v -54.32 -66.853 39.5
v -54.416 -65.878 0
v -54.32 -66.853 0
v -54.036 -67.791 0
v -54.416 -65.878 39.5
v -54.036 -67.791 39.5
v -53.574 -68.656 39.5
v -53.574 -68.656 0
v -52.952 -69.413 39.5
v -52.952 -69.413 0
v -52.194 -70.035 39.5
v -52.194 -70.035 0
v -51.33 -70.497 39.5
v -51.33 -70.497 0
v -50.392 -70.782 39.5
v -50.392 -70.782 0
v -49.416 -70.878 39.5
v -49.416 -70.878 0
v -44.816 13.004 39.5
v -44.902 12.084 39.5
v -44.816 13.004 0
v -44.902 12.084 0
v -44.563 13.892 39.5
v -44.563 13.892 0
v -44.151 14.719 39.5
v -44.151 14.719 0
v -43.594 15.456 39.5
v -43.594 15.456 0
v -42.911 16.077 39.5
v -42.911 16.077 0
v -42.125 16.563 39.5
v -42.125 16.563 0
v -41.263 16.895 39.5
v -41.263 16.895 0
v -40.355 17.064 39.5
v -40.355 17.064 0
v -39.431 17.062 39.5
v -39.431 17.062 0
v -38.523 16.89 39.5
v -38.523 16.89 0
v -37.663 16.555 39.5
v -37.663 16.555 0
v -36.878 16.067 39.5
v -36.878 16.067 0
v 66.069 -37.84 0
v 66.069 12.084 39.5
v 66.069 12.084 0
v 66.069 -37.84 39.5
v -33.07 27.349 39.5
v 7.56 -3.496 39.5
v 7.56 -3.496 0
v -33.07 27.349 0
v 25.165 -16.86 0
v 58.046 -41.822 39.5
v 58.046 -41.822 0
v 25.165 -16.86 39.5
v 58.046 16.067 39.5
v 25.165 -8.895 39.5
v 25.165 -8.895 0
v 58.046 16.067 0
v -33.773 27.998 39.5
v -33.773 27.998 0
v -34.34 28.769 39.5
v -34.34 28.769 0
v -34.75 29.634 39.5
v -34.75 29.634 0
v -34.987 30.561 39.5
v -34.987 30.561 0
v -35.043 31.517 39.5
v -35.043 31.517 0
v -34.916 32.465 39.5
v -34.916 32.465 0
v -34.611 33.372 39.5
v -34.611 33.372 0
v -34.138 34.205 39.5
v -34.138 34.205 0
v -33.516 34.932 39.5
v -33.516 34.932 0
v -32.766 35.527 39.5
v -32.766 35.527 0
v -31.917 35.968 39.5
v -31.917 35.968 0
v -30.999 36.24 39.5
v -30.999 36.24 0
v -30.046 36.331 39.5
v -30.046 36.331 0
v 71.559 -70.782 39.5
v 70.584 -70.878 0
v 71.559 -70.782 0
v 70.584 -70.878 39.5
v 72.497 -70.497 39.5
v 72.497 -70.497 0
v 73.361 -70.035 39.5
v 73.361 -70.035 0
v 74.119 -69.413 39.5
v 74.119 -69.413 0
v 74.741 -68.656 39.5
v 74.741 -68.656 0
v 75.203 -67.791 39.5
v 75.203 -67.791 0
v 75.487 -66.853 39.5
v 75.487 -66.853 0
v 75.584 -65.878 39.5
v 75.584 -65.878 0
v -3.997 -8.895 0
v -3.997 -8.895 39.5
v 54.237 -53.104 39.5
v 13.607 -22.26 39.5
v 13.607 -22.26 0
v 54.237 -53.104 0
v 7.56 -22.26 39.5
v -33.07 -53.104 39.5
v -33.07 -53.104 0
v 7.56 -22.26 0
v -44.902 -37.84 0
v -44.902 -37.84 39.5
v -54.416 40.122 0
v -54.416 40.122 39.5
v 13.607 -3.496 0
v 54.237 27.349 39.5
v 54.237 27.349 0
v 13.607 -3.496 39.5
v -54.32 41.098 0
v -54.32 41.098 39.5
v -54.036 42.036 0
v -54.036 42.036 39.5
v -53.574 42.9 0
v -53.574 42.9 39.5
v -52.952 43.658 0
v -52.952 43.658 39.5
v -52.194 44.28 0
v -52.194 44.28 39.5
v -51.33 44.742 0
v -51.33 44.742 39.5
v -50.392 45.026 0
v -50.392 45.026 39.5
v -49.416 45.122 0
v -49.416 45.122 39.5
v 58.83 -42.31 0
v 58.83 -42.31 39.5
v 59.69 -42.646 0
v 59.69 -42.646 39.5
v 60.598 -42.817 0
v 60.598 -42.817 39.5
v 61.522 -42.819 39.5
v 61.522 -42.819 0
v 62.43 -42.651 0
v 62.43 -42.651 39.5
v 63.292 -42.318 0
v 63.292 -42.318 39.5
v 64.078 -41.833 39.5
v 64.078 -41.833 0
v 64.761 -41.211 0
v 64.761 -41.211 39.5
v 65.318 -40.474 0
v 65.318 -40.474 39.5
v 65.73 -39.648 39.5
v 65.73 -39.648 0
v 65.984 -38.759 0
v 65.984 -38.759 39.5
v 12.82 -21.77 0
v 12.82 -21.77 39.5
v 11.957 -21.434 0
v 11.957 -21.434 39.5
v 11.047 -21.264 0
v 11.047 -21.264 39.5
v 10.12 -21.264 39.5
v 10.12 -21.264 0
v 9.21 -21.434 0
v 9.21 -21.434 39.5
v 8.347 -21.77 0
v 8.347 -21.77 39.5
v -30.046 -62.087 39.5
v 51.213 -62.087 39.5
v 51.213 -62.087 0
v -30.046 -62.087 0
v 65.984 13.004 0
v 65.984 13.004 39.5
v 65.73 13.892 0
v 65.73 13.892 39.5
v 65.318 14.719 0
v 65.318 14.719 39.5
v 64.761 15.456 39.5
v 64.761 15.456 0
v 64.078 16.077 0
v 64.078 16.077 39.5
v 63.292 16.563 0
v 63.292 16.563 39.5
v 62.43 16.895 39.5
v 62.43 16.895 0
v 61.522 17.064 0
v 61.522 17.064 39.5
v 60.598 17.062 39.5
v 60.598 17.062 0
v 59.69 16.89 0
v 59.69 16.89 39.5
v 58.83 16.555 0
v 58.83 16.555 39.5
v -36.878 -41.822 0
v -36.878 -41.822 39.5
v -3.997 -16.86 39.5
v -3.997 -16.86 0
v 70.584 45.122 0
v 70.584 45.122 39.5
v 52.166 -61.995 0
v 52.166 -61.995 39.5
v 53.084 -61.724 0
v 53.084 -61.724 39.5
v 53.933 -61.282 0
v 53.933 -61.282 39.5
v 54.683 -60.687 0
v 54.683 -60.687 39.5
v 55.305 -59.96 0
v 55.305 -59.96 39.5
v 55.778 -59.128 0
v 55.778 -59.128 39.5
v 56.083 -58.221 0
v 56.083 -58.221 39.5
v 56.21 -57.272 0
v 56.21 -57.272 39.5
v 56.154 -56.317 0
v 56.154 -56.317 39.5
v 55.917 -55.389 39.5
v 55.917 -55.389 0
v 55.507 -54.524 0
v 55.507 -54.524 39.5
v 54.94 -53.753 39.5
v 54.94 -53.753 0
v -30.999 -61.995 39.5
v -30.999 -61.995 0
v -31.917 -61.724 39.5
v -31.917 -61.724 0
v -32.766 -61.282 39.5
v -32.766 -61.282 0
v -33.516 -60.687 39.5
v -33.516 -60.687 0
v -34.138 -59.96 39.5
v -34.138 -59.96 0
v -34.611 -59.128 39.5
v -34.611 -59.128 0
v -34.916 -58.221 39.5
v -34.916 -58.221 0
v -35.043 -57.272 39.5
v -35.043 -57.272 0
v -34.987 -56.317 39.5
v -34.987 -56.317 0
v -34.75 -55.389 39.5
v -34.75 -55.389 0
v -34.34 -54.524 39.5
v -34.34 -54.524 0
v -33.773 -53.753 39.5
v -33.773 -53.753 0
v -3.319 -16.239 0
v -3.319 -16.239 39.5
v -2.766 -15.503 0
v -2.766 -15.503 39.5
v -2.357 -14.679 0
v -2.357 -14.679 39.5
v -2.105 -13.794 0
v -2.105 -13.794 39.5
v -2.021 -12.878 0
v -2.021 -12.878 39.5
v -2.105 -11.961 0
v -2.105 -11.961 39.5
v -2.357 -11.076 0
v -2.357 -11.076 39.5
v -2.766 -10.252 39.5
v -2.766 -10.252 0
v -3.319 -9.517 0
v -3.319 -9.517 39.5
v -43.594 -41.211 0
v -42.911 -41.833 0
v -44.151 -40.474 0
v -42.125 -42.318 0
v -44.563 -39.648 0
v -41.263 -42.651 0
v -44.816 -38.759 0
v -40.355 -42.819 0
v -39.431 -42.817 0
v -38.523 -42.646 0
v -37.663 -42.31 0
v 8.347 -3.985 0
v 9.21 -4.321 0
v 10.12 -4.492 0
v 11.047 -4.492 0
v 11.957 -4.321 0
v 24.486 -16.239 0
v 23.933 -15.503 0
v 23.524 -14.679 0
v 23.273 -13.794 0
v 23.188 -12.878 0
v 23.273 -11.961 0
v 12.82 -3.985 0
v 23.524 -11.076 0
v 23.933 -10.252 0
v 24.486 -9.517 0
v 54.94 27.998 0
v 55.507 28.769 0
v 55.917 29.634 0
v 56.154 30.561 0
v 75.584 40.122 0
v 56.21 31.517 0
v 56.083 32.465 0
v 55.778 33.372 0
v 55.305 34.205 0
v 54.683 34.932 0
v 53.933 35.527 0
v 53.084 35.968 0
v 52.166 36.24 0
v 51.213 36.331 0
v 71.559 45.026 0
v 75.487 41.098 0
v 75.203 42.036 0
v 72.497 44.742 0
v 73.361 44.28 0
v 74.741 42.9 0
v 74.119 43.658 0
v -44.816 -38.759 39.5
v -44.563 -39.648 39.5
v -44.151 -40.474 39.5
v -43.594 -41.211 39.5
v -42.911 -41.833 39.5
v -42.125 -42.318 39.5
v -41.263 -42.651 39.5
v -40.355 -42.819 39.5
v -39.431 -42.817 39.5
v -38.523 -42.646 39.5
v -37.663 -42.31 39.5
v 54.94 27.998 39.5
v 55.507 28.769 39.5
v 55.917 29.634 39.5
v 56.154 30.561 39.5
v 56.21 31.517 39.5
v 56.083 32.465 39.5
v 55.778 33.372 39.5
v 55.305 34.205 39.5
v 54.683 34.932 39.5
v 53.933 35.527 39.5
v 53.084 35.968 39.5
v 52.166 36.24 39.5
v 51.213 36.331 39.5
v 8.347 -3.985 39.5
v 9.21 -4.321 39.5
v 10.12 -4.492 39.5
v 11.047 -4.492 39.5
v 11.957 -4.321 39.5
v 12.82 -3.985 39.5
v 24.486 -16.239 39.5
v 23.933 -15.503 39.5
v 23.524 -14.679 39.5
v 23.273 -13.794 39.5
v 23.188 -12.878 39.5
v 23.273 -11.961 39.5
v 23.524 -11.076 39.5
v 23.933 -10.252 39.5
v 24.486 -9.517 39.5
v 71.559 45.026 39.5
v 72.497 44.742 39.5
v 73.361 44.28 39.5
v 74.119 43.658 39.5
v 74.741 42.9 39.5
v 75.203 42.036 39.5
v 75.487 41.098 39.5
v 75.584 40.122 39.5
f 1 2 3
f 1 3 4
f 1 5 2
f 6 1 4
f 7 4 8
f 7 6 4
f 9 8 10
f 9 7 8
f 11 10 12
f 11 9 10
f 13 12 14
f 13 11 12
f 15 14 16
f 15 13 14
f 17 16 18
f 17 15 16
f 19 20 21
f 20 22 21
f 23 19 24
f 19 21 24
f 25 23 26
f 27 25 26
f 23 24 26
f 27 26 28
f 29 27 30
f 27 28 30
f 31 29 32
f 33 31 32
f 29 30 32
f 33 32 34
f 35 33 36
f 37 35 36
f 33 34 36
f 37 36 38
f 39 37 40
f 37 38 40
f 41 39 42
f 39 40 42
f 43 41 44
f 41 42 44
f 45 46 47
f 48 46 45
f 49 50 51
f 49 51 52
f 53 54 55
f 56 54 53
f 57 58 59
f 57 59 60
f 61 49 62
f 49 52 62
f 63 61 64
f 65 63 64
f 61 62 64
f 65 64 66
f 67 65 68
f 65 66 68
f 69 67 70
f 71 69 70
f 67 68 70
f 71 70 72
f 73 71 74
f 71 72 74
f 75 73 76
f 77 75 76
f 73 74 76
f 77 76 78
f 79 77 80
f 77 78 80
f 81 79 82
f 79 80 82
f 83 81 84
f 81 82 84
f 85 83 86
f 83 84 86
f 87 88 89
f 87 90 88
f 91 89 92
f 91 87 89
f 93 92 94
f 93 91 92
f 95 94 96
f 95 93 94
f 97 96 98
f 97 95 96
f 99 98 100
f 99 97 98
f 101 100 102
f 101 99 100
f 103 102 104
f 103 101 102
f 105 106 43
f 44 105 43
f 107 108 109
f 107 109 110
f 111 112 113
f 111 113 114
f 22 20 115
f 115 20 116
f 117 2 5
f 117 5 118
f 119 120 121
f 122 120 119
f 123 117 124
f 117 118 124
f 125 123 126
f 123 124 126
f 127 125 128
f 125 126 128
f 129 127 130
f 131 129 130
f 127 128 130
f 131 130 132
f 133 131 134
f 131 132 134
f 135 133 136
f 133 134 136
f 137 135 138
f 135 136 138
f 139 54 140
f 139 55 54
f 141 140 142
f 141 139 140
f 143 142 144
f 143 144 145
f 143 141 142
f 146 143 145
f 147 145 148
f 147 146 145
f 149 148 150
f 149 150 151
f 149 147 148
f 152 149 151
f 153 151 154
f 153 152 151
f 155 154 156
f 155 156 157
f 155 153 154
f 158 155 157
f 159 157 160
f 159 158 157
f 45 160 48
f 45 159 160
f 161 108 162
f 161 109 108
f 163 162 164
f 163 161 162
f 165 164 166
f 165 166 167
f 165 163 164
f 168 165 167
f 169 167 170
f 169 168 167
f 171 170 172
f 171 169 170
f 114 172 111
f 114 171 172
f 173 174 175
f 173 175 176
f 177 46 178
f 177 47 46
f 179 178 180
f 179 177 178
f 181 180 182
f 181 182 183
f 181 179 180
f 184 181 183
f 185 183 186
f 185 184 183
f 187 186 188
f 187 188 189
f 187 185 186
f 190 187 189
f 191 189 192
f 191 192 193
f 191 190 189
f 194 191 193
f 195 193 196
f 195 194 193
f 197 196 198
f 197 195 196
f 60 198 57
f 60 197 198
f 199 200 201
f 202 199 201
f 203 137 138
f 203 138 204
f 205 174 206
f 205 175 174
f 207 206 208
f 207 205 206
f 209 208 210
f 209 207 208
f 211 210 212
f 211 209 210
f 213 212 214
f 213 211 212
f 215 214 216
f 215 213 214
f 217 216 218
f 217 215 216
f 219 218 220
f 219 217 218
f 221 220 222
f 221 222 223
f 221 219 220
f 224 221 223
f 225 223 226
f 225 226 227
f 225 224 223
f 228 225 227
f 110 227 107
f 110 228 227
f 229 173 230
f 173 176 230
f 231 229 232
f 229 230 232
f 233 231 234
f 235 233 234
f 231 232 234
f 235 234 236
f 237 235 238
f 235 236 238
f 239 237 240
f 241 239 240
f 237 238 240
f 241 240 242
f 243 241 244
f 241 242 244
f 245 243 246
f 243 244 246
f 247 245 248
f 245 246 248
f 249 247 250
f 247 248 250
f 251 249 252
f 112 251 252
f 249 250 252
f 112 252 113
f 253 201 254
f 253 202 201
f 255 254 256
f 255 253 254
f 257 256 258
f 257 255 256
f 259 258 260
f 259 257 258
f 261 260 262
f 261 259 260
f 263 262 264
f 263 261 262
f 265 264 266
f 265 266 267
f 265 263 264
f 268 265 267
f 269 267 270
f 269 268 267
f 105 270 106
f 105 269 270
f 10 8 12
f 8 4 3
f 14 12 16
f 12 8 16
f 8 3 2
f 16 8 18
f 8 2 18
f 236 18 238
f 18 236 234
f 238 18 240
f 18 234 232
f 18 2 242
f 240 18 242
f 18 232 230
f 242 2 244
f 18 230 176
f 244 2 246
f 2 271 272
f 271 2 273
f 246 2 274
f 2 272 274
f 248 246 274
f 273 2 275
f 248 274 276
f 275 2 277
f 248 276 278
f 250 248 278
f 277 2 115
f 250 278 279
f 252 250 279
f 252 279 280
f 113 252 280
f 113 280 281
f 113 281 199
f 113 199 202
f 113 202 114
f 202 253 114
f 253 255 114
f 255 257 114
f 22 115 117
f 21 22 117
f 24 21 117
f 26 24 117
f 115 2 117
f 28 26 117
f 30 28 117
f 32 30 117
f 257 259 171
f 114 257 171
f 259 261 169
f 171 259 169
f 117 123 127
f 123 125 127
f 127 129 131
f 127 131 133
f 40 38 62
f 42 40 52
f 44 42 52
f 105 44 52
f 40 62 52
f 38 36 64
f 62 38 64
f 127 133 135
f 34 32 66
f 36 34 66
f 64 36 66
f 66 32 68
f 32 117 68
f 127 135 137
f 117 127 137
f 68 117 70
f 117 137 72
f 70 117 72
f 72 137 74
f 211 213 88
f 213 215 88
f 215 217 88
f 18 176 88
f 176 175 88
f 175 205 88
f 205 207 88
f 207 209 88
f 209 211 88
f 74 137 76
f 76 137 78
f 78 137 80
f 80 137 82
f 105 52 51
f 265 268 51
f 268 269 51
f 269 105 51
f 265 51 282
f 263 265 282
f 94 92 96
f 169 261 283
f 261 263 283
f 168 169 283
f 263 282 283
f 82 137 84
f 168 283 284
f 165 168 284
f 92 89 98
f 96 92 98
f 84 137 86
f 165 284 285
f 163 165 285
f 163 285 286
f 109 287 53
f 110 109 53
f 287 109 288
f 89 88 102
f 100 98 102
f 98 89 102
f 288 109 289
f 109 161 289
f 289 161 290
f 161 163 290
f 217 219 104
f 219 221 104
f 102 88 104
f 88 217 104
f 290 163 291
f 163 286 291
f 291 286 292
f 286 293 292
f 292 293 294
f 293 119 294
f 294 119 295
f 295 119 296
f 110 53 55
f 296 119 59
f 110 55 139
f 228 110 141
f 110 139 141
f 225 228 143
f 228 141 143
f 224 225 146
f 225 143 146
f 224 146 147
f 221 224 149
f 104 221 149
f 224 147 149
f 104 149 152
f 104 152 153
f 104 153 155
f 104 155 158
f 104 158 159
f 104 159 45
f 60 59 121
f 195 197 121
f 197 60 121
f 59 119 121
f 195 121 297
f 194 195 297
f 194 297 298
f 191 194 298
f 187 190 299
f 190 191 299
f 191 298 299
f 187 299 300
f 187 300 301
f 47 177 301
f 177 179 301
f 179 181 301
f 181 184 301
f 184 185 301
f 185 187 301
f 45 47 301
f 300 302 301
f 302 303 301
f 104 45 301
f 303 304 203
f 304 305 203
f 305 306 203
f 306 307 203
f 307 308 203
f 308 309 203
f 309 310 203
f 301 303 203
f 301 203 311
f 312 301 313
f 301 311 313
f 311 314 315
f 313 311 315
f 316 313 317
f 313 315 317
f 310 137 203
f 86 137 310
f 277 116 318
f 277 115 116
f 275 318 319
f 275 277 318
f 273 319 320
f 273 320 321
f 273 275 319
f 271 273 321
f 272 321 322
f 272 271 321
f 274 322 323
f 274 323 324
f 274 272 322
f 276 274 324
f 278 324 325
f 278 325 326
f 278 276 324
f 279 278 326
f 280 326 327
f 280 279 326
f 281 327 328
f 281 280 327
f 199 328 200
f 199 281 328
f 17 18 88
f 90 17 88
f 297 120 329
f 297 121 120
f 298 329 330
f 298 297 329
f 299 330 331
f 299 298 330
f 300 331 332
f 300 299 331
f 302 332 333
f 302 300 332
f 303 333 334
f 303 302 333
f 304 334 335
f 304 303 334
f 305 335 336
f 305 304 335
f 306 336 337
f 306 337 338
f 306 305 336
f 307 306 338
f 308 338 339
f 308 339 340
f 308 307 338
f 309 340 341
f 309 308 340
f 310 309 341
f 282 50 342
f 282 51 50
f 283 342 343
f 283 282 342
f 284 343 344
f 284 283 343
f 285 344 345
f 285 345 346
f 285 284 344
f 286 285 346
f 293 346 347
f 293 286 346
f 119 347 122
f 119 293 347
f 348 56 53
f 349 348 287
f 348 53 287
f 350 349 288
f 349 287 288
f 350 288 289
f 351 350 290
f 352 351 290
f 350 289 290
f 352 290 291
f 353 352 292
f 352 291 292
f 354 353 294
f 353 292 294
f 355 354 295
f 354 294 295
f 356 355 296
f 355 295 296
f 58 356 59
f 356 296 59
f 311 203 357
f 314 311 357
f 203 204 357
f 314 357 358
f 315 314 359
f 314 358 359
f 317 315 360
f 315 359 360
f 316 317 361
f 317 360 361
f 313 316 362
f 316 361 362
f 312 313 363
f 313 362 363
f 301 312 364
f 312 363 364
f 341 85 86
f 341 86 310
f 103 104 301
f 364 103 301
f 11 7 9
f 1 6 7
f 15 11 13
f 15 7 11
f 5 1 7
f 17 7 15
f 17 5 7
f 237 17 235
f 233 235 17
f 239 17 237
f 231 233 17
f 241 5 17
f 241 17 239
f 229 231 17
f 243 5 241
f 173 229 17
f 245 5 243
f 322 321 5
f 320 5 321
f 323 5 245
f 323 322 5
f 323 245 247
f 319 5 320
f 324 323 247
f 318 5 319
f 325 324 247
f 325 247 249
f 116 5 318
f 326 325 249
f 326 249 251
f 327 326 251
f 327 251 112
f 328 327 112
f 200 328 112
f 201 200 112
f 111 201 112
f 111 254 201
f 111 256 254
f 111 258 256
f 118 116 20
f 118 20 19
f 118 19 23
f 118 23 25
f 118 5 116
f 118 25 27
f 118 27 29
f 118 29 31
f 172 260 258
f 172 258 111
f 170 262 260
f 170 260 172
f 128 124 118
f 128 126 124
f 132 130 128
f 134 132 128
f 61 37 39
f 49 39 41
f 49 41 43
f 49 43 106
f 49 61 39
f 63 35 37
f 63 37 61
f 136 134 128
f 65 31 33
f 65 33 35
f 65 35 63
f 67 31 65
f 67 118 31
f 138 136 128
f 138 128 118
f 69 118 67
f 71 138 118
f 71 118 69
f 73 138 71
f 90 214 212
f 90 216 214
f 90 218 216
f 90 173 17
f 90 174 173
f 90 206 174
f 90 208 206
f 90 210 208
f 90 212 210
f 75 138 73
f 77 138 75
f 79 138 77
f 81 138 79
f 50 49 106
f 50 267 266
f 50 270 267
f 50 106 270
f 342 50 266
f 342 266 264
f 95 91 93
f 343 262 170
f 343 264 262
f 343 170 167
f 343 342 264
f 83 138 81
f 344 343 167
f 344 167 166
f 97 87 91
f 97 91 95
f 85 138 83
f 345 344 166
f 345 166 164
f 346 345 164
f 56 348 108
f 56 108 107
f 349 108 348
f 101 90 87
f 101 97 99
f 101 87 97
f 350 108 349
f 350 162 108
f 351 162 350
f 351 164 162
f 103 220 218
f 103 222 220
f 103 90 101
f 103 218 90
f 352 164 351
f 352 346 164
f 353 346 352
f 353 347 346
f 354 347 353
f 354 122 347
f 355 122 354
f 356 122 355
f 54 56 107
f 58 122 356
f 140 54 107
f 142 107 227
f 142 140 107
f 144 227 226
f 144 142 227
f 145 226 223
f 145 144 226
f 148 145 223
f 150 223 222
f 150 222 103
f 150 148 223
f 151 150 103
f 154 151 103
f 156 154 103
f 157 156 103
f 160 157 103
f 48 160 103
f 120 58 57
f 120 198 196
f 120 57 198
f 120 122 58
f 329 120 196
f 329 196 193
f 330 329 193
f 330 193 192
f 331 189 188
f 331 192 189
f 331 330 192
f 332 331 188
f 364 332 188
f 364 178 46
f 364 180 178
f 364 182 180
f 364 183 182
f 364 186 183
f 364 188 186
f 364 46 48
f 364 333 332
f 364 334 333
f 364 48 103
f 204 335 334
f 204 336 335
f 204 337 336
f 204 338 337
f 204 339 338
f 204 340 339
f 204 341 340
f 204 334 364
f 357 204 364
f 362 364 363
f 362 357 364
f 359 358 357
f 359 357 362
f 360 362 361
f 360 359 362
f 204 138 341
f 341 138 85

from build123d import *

# Parameters (mm, degrees)
CROQUIS1_W              = 130
CROQUIS1_H              = 116
SALIENTE_EXTRUIR1_DEPTH = 39.5
CORTAR_EXTRUIR1_DEPTH   = 39.5
REDONDEO1_R             = 5


with BuildPart() as part:
    # Croquis1 → Saliente-Extruir1 (new body)
    with BuildSketch(Plane.XY):
        with Locations((10.583554643, -12.877675841)):
            Rectangle(CROQUIS1_W, CROQUIS1_H)
    extrude(amount=SALIENTE_EXTRUIR1_DEPTH)

    # Croquis2 → Cortar-Extruir1 (cut)
    with BuildSketch(Plane.XY.offset(39.5)):
        Polygon((-44.901782094, 36.331293299), (66.068891381, 36.331293299), (10.583554643, -5.790794085), align=None)
        Polygon((-44.901782094, 22.157529787), (-44.901782094, -47.912881469), (1.248356768, -12.877675841), align=None)
        Polygon((19.918752519, -12.877675841), (66.068891381, 22.157529787), (66.068891381, -47.912881469), align=None)
        Polygon((-44.901782094, -62.086644981), (10.583554643, -19.964557597), (66.068891381, -62.086644981), align=None)
    extrude(amount=-CORTAR_EXTRUIR1_DEPTH, mode=Mode.SUBTRACT)

    # Redondeo1
    redondeo1_edges = [part.edges().sort_by_distance(p)[0] for p in [
        (10.583554643, -5.790794085, 19.75),
        (-44.901782094, 36.331293299, 19.75),
        (66.068891381, 36.331293299, 19.75),
        (-44.901782094, 22.157529787, 19.75),
        (1.248356768, -12.877675841, 19.75),
        (-44.901782094, -47.912881469, 19.75),
        (66.068891381, -47.912881469, 19.75),
        (19.918752519, -12.877675841, 19.75),
        (66.068891381, 22.157529787, 19.75),
        (66.068891381, -62.086644981, 19.75),
        (-44.901782094, -62.086644981, 19.75),
        (10.583554643, -19.964557597, 19.75),
        (-54.416445357, 45.122324159, 19.75),
        (75.583554643, 45.122324159, 19.75),
        (75.583554643, -70.877675841, 19.75),
        (-54.416445357, -70.877675841, 19.75),
    ]]
    fillet(redondeo1_edges, radius=REDONDEO1_R)


solid = part.part
